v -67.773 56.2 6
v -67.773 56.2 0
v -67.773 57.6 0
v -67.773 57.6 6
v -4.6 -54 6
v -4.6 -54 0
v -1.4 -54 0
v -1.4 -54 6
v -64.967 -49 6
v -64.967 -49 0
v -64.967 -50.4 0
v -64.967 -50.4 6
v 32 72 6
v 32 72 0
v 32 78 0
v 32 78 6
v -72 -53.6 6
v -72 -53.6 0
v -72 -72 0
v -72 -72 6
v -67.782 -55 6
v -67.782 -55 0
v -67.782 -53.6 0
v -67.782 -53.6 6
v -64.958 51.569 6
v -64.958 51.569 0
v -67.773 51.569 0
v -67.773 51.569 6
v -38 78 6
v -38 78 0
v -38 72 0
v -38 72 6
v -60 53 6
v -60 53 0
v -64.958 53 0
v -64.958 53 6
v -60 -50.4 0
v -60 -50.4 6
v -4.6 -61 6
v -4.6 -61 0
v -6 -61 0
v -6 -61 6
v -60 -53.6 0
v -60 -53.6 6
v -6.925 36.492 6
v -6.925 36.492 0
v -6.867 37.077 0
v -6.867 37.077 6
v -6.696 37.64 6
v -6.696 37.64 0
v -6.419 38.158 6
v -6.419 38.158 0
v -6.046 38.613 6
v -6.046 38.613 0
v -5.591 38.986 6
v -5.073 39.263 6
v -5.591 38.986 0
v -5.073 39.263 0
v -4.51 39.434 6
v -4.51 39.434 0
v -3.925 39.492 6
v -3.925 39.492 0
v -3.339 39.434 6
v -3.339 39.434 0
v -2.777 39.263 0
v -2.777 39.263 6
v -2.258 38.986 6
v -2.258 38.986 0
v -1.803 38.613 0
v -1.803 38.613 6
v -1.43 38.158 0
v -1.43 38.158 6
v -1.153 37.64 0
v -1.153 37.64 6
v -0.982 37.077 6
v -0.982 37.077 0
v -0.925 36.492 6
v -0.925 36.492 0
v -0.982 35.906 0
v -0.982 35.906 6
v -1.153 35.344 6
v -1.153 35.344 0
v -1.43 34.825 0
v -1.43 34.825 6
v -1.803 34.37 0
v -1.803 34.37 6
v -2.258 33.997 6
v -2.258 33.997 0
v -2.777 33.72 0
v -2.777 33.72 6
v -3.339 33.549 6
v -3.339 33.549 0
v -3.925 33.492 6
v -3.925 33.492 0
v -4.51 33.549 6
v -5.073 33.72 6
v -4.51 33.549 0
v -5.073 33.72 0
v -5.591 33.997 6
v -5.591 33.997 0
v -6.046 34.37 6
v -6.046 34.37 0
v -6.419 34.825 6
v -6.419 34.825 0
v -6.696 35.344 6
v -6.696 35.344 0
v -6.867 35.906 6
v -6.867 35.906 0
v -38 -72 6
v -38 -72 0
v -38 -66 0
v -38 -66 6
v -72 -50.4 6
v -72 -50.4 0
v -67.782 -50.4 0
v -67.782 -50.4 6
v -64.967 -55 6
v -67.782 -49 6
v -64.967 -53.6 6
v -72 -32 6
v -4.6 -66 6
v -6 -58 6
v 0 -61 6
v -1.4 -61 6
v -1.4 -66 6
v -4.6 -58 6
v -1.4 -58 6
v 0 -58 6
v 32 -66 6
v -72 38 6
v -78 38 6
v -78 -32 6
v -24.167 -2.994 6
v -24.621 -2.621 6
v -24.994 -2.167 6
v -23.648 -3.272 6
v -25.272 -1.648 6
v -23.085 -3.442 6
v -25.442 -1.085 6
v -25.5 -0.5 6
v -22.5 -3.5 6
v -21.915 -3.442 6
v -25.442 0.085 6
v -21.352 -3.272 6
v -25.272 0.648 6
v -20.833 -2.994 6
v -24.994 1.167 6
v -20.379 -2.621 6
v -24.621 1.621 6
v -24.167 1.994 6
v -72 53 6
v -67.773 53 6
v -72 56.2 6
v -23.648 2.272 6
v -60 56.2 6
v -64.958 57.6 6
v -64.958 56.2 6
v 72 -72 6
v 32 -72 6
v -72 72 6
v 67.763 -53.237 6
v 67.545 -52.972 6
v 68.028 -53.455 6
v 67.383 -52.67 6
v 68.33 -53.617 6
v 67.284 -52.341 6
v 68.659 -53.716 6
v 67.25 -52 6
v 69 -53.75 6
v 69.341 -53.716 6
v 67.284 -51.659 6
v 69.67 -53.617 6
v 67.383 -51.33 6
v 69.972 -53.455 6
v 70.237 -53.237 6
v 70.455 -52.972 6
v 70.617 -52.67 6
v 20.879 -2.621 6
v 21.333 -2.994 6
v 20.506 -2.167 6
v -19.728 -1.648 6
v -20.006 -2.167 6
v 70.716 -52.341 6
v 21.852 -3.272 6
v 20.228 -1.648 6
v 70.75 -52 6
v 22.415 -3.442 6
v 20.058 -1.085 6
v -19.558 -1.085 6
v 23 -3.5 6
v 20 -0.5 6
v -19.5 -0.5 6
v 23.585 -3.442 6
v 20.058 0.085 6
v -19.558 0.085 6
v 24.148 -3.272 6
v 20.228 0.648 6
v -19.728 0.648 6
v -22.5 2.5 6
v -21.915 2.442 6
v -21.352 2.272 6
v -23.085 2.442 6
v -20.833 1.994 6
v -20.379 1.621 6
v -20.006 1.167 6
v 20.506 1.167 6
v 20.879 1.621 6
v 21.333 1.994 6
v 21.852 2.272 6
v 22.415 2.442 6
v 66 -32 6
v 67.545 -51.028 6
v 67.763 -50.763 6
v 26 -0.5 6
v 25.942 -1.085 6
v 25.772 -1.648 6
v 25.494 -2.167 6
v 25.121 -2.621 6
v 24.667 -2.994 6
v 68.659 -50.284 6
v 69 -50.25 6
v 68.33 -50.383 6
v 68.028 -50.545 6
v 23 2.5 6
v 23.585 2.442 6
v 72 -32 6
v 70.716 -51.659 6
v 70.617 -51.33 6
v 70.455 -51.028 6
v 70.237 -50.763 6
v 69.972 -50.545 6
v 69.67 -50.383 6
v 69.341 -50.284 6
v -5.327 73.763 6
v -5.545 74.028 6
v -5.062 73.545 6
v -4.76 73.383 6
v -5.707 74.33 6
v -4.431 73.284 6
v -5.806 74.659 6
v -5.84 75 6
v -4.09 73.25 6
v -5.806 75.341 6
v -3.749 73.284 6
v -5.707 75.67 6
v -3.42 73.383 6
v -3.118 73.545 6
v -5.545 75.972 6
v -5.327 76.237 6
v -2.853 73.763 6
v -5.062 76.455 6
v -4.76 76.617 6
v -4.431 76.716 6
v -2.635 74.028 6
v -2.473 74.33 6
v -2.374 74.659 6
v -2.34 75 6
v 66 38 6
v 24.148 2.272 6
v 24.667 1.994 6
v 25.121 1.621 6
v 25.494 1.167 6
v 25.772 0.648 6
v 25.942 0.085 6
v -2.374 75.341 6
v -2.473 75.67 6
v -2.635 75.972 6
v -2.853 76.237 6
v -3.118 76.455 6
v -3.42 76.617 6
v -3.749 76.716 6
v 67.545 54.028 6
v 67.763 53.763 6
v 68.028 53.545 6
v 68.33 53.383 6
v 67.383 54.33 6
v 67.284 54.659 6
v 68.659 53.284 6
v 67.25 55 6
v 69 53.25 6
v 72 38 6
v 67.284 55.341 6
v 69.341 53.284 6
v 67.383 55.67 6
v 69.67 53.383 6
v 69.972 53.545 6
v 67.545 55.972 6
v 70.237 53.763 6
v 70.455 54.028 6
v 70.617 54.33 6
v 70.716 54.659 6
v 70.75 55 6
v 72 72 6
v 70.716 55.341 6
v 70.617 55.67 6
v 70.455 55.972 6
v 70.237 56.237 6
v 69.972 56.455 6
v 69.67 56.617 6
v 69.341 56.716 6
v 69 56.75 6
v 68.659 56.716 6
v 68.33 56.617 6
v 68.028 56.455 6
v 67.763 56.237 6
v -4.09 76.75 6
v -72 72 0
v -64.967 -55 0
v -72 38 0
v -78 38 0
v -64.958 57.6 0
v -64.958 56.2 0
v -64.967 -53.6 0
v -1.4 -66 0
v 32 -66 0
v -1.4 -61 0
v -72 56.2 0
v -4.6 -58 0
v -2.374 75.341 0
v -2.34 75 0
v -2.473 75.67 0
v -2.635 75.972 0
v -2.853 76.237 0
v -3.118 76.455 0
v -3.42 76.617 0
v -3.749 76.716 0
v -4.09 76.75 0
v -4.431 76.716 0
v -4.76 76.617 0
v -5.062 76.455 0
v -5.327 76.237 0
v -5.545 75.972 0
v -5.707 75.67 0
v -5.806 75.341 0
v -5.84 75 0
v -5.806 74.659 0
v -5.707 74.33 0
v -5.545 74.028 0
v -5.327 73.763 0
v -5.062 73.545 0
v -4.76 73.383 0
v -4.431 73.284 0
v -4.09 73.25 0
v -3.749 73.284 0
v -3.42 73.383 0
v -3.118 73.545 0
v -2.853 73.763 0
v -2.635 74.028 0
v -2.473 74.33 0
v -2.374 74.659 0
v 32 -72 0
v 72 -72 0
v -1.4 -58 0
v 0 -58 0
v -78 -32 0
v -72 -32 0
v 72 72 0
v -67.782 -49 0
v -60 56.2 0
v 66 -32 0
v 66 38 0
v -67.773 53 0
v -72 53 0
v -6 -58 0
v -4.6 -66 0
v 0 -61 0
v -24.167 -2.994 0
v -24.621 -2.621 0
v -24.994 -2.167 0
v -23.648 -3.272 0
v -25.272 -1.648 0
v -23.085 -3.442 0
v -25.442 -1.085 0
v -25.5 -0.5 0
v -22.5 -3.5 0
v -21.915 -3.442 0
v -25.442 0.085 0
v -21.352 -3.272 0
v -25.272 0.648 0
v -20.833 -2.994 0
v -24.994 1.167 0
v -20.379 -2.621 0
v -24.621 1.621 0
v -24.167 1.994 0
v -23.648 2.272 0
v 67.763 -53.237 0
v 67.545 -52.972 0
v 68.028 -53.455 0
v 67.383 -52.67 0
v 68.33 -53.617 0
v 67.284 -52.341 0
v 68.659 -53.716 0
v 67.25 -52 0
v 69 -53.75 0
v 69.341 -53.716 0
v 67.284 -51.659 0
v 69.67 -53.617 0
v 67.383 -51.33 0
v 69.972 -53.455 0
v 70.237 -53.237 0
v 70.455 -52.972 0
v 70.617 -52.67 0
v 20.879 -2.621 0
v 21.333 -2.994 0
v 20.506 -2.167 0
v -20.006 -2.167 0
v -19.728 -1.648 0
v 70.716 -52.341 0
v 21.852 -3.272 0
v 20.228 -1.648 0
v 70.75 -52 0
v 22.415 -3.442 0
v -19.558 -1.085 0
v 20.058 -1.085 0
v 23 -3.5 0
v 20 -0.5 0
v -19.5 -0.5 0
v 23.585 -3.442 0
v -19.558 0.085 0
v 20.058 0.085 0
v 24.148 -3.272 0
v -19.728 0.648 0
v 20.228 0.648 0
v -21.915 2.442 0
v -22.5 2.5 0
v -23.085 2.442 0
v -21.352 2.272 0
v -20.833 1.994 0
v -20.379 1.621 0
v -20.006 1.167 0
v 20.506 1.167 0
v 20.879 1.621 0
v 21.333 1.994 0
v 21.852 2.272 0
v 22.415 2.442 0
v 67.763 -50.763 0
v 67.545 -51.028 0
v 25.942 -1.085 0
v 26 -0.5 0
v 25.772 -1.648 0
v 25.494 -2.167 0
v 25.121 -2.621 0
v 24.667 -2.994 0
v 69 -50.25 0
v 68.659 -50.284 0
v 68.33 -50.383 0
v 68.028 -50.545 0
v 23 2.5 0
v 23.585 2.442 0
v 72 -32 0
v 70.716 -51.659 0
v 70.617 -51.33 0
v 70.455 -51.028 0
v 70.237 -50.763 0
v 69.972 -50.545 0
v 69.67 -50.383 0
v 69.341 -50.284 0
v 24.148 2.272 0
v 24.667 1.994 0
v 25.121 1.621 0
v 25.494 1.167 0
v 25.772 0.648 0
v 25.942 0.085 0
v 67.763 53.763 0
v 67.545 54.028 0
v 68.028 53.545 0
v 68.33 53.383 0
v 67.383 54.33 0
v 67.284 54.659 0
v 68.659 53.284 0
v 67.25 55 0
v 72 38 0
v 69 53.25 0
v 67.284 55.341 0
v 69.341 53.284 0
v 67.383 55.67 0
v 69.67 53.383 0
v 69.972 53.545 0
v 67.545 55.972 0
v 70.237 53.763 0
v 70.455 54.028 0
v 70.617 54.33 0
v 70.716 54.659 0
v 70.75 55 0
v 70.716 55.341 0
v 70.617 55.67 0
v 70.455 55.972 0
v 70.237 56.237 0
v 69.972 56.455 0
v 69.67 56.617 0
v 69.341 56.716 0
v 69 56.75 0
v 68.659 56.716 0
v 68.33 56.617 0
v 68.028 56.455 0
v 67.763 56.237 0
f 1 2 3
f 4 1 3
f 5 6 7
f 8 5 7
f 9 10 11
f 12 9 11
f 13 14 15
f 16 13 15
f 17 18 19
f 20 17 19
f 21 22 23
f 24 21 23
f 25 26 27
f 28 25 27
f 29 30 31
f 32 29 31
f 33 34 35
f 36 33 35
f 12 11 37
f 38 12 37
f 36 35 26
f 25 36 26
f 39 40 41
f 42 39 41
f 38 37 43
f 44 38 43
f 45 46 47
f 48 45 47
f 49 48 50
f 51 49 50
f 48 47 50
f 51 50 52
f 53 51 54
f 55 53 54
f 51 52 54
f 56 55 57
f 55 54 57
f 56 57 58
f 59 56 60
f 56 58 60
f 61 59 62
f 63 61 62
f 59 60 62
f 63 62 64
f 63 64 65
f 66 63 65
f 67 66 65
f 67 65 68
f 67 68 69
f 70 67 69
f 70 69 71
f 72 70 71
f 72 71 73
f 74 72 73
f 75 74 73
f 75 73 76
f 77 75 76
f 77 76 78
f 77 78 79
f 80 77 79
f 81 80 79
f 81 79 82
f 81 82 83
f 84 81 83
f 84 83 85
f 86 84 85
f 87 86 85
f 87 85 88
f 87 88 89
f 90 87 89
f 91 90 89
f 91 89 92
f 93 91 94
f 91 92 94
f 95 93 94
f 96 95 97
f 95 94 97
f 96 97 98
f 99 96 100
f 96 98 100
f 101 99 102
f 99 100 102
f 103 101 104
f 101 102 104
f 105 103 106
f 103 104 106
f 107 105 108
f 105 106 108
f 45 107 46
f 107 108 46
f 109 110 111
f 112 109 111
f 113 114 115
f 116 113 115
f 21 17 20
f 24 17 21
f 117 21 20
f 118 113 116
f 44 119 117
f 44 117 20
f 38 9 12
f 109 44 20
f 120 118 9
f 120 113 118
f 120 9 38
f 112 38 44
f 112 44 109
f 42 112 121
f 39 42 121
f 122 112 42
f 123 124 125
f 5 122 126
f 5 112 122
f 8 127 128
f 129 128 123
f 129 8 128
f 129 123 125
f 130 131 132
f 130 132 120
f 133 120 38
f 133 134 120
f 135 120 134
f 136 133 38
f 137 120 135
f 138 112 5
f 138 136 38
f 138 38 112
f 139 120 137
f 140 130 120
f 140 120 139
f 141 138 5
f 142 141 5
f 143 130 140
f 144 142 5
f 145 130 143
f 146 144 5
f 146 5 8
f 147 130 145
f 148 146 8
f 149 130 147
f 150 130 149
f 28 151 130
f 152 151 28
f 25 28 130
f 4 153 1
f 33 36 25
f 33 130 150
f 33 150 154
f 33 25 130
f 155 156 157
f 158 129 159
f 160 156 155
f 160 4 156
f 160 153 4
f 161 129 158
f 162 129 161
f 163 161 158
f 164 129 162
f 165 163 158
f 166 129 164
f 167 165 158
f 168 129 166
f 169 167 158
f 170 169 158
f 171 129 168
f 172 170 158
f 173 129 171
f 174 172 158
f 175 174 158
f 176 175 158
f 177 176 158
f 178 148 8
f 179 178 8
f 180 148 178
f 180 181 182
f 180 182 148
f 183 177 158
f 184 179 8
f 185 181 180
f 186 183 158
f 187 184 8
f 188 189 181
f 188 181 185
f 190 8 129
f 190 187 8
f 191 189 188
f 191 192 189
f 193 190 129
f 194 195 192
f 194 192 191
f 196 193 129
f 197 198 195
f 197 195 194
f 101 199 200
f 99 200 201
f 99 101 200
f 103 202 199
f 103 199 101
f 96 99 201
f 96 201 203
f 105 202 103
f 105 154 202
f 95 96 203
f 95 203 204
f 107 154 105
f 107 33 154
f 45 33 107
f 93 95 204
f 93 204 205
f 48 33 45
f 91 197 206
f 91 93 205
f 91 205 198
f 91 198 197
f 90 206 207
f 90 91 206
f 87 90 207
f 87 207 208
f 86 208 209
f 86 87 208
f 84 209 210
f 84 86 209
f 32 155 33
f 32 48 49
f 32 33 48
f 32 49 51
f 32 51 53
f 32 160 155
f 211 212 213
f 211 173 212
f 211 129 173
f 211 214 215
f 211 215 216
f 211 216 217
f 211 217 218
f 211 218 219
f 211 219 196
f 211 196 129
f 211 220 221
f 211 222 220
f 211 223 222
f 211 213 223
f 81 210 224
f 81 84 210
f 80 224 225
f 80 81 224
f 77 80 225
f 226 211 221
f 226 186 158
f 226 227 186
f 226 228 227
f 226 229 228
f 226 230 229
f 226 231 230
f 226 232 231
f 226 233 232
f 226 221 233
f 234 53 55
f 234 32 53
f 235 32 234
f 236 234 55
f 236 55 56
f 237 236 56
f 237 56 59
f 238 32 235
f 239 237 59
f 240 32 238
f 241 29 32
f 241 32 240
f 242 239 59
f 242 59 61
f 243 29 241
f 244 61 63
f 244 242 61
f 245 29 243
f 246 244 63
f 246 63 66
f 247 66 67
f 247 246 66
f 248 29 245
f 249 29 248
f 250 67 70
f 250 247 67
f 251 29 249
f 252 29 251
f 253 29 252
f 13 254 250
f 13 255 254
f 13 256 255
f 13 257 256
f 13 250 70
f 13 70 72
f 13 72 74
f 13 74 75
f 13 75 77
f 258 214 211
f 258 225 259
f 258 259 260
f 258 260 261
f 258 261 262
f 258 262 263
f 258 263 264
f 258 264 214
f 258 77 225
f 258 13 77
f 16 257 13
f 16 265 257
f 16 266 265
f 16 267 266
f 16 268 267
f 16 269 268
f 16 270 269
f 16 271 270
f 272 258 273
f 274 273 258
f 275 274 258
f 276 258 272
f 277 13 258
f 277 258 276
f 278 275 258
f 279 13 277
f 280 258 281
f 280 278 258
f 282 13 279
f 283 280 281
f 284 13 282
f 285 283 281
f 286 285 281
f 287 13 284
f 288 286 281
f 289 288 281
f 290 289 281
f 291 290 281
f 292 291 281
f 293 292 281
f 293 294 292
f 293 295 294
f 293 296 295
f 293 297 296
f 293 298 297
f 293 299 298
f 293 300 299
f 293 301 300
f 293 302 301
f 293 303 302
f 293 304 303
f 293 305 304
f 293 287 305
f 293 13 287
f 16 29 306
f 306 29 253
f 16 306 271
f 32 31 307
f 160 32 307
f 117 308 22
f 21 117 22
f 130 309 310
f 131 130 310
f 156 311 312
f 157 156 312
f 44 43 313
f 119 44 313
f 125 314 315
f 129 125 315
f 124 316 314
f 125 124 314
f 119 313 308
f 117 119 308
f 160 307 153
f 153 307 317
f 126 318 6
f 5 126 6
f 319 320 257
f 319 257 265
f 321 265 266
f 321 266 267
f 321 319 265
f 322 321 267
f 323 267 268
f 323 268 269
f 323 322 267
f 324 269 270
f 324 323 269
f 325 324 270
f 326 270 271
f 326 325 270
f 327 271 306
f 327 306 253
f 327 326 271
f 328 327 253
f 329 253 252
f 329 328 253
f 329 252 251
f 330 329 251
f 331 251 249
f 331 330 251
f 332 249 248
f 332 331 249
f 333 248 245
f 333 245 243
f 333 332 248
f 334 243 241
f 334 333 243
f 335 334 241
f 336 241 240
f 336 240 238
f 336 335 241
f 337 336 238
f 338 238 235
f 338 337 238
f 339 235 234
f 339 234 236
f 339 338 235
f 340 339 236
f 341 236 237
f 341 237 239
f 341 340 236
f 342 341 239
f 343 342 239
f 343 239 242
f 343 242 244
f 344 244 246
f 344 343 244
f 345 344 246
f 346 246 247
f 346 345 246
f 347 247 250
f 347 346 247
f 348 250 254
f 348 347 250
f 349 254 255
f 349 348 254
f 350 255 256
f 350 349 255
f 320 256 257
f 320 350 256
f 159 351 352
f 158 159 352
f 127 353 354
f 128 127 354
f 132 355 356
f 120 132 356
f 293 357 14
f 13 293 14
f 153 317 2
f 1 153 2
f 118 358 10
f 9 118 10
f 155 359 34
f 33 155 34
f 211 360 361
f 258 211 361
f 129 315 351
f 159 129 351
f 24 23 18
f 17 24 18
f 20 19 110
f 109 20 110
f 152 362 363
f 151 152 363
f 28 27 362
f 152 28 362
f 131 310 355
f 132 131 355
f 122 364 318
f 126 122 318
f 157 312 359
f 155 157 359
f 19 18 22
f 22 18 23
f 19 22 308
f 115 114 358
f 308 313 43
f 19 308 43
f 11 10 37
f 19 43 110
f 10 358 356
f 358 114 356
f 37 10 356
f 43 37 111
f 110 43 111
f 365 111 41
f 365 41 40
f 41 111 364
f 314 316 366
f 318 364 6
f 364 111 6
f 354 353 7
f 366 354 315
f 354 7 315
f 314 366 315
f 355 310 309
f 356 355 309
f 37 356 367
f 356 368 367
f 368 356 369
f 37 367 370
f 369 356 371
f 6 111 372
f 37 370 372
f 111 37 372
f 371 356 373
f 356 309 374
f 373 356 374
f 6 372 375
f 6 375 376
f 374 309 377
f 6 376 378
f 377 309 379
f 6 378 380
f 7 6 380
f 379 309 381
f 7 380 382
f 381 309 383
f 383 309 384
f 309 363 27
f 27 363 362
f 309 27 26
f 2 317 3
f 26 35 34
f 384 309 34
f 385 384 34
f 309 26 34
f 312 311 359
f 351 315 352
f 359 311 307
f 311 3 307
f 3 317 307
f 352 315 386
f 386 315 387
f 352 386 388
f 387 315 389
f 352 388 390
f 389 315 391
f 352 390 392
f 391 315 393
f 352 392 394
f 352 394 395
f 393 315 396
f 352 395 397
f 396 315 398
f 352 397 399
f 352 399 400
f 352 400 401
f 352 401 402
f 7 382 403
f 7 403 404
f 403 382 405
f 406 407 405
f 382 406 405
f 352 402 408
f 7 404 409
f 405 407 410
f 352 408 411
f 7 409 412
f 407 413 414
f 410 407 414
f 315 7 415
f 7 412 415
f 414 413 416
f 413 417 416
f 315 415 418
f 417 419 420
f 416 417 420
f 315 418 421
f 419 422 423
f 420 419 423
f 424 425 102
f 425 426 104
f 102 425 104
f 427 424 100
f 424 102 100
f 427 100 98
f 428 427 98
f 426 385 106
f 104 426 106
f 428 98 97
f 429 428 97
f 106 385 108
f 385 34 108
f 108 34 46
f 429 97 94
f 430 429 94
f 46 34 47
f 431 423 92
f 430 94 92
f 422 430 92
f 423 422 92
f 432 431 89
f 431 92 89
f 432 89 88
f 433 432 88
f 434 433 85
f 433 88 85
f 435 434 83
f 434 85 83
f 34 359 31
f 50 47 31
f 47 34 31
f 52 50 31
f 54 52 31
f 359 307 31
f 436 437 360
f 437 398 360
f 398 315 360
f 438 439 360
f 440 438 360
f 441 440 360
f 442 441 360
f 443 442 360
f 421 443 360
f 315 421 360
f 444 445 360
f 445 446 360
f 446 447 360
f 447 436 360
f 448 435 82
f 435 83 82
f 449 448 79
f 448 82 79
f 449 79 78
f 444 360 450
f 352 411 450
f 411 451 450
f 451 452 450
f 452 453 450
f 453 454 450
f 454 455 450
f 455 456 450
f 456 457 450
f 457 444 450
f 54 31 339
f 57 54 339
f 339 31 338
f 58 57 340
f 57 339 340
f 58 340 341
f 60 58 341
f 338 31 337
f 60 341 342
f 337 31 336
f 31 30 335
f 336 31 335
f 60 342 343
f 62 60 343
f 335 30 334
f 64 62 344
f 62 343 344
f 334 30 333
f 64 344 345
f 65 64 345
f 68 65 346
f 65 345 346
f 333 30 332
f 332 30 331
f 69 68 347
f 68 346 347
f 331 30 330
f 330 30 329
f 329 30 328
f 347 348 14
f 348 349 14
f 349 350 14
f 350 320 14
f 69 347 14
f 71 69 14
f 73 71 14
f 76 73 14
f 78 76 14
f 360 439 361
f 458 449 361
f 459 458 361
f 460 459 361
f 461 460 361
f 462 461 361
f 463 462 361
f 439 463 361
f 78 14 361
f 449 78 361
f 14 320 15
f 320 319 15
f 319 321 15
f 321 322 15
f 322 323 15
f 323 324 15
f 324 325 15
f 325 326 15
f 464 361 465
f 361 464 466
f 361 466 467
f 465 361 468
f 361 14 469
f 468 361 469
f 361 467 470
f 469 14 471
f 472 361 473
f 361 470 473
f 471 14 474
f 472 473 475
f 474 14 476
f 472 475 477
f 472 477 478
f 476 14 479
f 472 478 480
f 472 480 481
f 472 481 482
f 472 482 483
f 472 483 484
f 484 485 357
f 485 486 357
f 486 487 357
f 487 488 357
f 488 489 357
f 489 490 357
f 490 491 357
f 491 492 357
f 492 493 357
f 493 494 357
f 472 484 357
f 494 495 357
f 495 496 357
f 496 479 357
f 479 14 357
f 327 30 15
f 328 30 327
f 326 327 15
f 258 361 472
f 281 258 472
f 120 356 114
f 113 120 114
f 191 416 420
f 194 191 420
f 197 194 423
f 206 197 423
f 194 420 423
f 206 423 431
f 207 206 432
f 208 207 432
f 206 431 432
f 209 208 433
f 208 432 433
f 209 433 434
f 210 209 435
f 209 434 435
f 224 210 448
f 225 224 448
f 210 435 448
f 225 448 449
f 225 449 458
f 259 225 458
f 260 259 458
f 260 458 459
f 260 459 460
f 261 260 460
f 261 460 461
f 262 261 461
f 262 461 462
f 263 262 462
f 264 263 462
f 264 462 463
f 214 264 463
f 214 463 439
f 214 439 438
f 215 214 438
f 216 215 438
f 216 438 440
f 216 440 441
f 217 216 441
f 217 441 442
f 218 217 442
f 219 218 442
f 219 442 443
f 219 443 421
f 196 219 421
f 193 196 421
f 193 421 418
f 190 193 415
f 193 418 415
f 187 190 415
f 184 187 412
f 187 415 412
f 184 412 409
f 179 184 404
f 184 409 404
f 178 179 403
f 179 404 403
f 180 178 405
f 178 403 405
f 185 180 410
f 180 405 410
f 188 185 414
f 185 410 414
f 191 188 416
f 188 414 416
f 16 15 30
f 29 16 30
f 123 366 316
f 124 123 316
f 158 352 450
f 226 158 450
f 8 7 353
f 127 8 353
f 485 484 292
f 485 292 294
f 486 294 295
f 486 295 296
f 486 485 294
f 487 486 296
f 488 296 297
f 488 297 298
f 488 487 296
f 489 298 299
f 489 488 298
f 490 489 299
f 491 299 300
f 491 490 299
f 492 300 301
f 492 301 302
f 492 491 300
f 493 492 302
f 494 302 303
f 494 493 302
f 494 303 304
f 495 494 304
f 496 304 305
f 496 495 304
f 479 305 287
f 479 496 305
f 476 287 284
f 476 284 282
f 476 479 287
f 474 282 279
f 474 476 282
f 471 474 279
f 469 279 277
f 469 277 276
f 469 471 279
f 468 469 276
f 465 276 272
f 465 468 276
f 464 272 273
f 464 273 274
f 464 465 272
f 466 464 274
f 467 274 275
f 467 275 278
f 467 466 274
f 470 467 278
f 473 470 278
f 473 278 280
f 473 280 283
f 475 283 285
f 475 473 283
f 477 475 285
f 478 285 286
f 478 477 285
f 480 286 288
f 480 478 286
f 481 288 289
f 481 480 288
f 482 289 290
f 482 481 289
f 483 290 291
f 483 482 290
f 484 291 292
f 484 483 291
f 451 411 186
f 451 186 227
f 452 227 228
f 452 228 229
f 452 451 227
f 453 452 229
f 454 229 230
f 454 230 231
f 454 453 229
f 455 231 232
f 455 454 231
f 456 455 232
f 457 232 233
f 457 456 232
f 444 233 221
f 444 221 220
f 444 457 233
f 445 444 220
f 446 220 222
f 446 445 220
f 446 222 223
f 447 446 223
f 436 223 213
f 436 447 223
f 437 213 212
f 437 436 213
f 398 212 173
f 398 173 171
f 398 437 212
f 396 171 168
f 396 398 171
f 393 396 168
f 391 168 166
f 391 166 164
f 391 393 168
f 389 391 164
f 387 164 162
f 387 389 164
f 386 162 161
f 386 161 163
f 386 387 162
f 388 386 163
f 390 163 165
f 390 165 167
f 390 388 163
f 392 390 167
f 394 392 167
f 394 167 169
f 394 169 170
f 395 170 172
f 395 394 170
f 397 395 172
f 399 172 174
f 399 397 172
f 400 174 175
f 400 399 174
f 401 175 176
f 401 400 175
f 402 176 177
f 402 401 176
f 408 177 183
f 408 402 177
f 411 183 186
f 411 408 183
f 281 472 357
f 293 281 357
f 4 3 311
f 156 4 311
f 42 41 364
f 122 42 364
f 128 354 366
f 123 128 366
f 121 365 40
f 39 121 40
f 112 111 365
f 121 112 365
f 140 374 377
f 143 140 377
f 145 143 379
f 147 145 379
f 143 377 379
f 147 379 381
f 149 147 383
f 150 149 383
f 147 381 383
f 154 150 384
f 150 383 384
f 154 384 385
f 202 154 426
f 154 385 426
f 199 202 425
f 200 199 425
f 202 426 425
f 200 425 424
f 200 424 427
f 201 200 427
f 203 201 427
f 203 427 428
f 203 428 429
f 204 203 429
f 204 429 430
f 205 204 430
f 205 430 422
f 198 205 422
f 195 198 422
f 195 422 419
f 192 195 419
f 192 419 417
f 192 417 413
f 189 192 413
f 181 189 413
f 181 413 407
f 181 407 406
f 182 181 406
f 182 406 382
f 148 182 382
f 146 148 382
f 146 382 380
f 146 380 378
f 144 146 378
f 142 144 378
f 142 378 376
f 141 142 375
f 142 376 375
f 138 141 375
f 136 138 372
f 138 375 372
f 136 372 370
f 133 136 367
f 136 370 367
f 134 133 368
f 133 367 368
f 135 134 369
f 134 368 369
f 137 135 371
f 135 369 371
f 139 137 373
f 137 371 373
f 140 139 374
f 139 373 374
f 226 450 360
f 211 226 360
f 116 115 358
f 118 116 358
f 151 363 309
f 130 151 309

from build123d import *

# Parameters (mm, degrees)
SKETCH1_R           = 1.75
BOSS_EXTRUDE2_DEPTH = 6
SKETCH3_R           = 3
CUT_EXTRUDE1_DEPTH  = 7
SKETCH4_R           = 3
CUT_EXTRUDE2_DEPTH  = 7


with BuildPart() as part:
    # Sketch1 → Boss-Extrude2 (new body)
    with BuildSketch(Plane.XY):
        Polygon((72, 72), (32, 72), (32, 78), (-38, 78), (-38, 72), (-72, 72), (-72, 56.2), (-67.772810154, 56.2), (-67.772810154, 57.6), (-64.957983727, 57.6), (-64.957983727, 56.2), (-60, 56.2), (-60, 53), (-64.957983727, 53), (-64.957983727, 51.568504207), (-67.772810154, 51.568504207), (-67.772810154, 53), (-72, 53), (-72, 38), (-78, 38), (-78, -32), (-72, -32), (-72, -50.4), (-67.78187279, -50.4), (-67.78187279, -49), (-64.967046362, -49), (-64.967046362, -50.4), (-60, -50.4), (-60, -53.6), (-64.967046362, -53.6), (-64.967046362, -55), (-67.78187279, -55), (-67.78187279, -53.6), (-72, -53.6), (-72, -72), (-38, -72), (-38, -66), (-4.6, -66), (-4.6, -61), (-6, -61), (-6, -58), (-4.6, -58), (-4.6, -54), (-1.4, -54), (-1.4, -58), (0, -58), (0, -61), (-1.4, -61), (-1.4, -66), (32, -66), (32, -72), (72, -72), (72, -32), (66, -32), (66, 38), (72, 38), align=None)
        with Locations((69, -52)):
            Circle(SKETCH1_R, mode=Mode.SUBTRACT)
        with Locations((69, 55)):
            Circle(SKETCH1_R, mode=Mode.SUBTRACT)
        with Locations((-4.09, 75)):
            Circle(SKETCH1_R, mode=Mode.SUBTRACT)
    extrude(amount=BOSS_EXTRUDE2_DEPTH)

    # Sketch3 → Cut-Extrude1 (cut, through all)
    with BuildSketch(Plane(origin=(0, 0, 0), x_dir=(-1, 0, 0), z_dir=(0, 0, -1))):
        with Locations((3.924742841, 36.491728523)):
            Circle(SKETCH3_R)
    extrude(amount=-CUT_EXTRUDE1_DEPTH, mode=Mode.SUBTRACT)

    # Sketch4 → Cut-Extrude2 (cut, through all)
    with BuildSketch(Plane(origin=(0, 0, 0), x_dir=(-1, 0, 0), z_dir=(0, 0, -1))):
        with Locations((-23, -0.5)):
            Circle(SKETCH4_R)
        with Locations((22.5, -0.5)):
            Circle(SKETCH4_R)
    extrude(amount=-CUT_EXTRUDE2_DEPTH, mode=Mode.SUBTRACT)


solid = part.part
